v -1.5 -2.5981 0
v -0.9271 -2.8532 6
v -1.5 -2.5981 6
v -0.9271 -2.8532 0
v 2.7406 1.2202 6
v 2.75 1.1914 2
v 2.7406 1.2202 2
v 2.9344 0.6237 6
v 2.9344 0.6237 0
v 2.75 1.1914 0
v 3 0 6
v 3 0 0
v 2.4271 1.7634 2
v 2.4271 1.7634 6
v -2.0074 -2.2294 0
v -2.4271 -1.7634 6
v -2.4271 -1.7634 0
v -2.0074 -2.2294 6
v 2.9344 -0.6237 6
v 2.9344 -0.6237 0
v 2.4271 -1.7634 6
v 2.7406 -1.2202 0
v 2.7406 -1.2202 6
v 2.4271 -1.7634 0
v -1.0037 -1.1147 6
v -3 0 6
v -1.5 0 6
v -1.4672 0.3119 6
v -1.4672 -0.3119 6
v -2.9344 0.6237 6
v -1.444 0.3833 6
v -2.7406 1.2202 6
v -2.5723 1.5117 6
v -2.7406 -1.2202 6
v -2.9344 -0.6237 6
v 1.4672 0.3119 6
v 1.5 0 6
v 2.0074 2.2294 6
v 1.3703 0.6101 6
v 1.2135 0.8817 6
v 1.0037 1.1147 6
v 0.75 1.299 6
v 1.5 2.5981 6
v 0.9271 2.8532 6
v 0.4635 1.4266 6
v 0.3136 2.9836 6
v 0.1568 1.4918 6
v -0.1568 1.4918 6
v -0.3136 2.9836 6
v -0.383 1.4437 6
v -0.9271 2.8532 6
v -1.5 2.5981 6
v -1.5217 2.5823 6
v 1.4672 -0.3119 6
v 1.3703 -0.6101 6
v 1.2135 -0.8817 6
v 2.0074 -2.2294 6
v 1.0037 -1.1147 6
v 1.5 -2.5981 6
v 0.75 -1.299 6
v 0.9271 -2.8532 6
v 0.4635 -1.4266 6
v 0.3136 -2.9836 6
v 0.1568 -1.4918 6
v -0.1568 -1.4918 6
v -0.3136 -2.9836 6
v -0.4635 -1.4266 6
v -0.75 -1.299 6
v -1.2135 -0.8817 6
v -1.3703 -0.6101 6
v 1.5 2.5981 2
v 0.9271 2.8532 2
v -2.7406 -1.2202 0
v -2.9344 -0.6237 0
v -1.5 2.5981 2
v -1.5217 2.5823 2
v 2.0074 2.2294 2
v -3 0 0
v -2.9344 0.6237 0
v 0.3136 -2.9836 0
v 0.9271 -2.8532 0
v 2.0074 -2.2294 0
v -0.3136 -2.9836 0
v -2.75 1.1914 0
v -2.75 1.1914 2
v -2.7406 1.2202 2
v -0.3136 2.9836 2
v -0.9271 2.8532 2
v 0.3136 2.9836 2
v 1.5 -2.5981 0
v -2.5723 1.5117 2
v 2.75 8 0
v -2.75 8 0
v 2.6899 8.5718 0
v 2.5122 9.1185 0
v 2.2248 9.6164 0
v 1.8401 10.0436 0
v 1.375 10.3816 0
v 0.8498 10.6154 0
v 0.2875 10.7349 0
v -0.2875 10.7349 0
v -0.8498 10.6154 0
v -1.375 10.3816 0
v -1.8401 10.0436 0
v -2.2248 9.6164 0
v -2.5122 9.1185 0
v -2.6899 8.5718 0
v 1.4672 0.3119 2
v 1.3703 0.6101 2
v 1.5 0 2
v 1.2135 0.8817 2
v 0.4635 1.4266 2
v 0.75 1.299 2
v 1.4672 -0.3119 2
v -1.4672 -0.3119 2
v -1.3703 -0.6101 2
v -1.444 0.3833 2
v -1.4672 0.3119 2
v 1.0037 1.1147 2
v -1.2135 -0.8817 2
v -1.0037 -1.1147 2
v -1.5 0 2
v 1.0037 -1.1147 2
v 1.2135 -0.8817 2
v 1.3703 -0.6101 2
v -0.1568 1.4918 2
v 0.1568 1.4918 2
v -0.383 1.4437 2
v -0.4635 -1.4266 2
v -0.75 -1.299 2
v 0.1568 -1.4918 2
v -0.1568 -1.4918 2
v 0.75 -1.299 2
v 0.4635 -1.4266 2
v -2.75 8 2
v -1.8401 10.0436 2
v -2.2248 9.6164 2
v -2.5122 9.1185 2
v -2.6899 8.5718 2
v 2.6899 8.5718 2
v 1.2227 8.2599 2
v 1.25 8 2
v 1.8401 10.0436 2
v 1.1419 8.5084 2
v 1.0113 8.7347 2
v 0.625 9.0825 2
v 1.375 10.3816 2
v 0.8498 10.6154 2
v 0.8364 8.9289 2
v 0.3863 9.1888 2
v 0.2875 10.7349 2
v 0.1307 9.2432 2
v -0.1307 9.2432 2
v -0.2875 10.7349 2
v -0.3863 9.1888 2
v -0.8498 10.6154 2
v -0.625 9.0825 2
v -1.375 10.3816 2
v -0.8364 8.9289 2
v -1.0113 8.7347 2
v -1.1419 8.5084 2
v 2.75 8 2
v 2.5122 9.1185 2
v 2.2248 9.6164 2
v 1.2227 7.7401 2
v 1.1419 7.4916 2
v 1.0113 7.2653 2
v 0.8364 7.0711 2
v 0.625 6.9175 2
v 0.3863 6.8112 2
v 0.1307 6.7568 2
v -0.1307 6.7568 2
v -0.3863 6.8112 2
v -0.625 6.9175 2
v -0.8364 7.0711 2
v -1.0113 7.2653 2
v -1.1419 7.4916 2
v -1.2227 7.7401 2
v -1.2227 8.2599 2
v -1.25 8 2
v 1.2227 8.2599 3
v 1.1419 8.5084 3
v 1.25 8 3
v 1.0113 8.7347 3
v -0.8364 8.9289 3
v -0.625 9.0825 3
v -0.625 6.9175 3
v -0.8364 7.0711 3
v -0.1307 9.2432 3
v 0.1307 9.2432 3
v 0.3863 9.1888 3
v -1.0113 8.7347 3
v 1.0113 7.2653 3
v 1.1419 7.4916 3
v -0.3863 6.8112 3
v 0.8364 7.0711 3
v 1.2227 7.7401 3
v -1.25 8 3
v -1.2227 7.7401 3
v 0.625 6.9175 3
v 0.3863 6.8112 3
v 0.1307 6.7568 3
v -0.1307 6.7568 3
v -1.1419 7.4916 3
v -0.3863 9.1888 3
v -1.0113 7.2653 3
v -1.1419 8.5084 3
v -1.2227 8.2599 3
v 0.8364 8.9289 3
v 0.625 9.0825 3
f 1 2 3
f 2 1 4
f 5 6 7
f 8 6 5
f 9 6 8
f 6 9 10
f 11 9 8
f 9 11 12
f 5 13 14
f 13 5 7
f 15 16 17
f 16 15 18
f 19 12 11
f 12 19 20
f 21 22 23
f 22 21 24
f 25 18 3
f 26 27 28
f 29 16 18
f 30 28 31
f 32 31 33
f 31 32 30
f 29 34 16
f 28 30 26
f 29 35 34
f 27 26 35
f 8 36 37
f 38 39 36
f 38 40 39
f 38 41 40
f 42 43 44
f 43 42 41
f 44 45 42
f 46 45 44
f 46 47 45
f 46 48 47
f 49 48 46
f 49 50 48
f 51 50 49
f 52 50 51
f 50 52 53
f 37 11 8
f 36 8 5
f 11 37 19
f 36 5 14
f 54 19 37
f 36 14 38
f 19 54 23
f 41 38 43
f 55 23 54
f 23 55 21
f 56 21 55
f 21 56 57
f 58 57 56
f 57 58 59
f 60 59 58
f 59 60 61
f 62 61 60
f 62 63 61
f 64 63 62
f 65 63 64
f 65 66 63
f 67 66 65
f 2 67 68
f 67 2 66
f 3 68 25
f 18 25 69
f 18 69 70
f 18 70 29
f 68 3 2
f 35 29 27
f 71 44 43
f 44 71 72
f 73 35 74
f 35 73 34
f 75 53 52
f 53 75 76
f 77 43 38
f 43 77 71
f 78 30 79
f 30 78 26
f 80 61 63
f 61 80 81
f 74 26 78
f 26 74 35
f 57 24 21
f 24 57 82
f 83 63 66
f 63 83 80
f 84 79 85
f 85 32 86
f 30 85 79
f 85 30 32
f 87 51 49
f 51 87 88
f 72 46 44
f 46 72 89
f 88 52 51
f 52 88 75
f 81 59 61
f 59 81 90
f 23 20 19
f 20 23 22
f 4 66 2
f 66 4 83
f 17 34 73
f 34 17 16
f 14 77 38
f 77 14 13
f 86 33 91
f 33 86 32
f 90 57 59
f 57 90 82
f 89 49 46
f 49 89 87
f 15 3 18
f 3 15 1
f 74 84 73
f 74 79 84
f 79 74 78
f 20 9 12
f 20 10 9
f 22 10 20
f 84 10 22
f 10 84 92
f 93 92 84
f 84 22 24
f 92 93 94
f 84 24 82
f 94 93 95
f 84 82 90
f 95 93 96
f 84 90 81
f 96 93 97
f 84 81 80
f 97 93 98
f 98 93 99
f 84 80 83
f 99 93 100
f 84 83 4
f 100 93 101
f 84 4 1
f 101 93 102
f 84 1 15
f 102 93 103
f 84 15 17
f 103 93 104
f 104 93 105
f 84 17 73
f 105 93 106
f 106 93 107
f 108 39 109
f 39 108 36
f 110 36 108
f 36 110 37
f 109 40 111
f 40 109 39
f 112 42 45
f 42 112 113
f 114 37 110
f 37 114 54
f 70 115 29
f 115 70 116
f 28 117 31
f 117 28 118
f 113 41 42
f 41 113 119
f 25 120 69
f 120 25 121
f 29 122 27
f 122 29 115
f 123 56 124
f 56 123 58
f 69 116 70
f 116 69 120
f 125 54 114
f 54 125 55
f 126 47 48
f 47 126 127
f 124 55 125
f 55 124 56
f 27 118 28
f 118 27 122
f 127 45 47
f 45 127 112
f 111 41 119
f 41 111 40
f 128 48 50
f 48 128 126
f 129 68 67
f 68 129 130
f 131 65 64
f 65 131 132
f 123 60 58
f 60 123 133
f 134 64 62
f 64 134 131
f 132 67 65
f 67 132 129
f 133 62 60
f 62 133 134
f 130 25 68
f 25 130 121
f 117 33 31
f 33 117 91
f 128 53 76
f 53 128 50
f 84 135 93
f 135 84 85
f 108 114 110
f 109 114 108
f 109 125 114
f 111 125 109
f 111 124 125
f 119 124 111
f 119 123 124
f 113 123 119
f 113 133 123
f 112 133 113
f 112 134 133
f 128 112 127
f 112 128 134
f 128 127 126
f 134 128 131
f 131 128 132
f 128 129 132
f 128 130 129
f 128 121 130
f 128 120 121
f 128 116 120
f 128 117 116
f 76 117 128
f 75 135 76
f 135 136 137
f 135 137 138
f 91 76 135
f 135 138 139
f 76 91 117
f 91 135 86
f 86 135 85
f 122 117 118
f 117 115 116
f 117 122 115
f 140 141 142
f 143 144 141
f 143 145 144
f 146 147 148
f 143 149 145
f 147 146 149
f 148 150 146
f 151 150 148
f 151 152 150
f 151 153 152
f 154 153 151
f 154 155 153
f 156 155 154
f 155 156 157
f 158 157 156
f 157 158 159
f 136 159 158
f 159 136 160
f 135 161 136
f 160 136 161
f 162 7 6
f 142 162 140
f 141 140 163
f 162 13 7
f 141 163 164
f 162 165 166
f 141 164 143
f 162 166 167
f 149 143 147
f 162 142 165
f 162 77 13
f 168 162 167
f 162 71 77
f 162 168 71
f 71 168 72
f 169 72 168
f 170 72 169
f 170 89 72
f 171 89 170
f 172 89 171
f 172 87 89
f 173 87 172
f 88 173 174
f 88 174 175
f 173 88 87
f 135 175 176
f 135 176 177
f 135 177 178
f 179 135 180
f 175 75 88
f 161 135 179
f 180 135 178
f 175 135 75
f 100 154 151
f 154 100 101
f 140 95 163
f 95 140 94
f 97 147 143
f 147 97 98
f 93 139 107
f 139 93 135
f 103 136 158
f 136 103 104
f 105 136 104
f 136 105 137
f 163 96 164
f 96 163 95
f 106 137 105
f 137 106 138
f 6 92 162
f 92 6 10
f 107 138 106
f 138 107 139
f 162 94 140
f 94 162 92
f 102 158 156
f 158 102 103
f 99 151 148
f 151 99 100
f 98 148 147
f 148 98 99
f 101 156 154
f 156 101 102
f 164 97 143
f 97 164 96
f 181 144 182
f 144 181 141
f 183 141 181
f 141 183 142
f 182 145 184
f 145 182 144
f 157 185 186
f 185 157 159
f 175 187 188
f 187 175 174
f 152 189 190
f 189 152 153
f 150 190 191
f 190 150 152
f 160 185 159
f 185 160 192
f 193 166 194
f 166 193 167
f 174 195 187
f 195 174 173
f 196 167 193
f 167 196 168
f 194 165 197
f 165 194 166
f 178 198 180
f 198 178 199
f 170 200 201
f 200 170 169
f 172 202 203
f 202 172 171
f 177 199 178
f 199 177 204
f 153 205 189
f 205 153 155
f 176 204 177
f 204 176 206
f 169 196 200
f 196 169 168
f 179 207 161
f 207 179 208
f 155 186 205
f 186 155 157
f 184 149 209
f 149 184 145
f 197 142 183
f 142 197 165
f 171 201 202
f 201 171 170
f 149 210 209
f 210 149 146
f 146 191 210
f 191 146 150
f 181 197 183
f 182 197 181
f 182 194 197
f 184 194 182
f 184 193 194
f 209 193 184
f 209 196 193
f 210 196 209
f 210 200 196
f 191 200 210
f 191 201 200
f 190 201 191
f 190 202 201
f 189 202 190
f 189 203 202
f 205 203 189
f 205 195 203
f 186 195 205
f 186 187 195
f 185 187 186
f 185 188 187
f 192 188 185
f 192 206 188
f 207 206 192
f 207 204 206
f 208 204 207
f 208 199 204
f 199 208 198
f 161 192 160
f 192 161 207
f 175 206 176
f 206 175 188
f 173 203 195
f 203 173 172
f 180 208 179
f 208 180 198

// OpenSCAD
picture_height = 144;
picture_width = 188;

mould_width = 18;
mould_thickness = 2;

inset_width = 7;
inset_depth = 5;

peg_diam = 6;
peg_depth = 6;
peg_foot_thickness = 2;
peg_foot_width = 5.5;
peg_foot_length = 13.5;
peg_well_wall_thickness = 2;
peg_wall_thickness = 1.5;
peg_wall_crack = 1.5;
peg_toe_height = 1;
peg_toe_diam = 2.5;

$fs = 0.1;

module moulding() {
  mirror([ 0, 1 ]) difference() {
    import("moulding.svg");
    offset(delta = -mould_thickness) import("moulding.svg");
    square([ inset_depth, mould_width - mould_thickness ]);
  }
}

module peg_well() {
  intersection() {
    rotate([ 0, -90, 0 ]) linear_extrude(peg_diam * 2, center = true)
        mirror([ 0, 1 ]) import("moulding.svg");
    translate([ 0, -(mould_width + inset_width) / 2, peg_foot_thickness ])
        difference() {
      cylinder(h = mould_width, d = peg_diam + 2 * peg_well_wall_thickness);
      cylinder(h = mould_width * 2, d = peg_diam, center = true);
    }
  }
}

module peg() {
  union() {
    hull() {
      cylinder(h = peg_foot_thickness, d = peg_foot_width);
      translate([ 0, peg_foot_length - peg_foot_width, 0 ])
          cylinder(h = peg_foot_thickness, d = peg_foot_width);
    }
    difference() {
      cylinder(d = peg_diam, h = peg_depth);
      cylinder(d = peg_diam - 2 * peg_wall_thickness, h = peg_depth * 3,
               center = true);
      rotate([ 0, 0, 45 ]) translate([ 0, peg_diam / 2, 0 ])
          cube([ peg_wall_crack, peg_diam, peg_depth * 3 ], center = true);
    }
    translate([ 0, peg_foot_length - peg_foot_width, 0 ])
        cylinder(h = peg_foot_thickness + peg_toe_height, d = peg_toe_diam);
  }
}

module edge(length) {
  union() {
    intersection() {
      rotate([ 0, -90, 0 ]) linear_extrude(length, center = true) moulding();
      linear_extrude(mould_width) translate([ 0, -mould_width ])
          polygon([ [ -length / 2, 0 ], [ length / 2, 0 ], [ 0, length / 2 ] ]);
    }
    if (length > 200) {
      translate([ -50, 0, 0 ]) peg_well();
      translate([ 50, 0, 0 ]) peg_well();
    } else {
      peg_well();
    }
  }
}

module frame() {
  frame_width = picture_width + 2 * (mould_width - inset_width);
  frame_height = picture_height + 2 * (mould_width - inset_width);
  top_edge = picture_height / 2 - inset_width;
  right_edge = picture_width / 2 - inset_width;
  translate([ 0, top_edge, 0 ]) rotate([ 0, 0, 180 ]) edge(frame_width);
  translate([ right_edge, 0, 0 ]) rotate([ 0, 0, 90 ]) edge(frame_height);
  translate([ 0, -top_edge, 0 ]) rotate([ 0, 0, 0 ]) edge(frame_width);
  translate([ -right_edge, 0, 0 ]) rotate([ 0, 0, -90 ]) edge(frame_height);
}
// frame();
peg();
